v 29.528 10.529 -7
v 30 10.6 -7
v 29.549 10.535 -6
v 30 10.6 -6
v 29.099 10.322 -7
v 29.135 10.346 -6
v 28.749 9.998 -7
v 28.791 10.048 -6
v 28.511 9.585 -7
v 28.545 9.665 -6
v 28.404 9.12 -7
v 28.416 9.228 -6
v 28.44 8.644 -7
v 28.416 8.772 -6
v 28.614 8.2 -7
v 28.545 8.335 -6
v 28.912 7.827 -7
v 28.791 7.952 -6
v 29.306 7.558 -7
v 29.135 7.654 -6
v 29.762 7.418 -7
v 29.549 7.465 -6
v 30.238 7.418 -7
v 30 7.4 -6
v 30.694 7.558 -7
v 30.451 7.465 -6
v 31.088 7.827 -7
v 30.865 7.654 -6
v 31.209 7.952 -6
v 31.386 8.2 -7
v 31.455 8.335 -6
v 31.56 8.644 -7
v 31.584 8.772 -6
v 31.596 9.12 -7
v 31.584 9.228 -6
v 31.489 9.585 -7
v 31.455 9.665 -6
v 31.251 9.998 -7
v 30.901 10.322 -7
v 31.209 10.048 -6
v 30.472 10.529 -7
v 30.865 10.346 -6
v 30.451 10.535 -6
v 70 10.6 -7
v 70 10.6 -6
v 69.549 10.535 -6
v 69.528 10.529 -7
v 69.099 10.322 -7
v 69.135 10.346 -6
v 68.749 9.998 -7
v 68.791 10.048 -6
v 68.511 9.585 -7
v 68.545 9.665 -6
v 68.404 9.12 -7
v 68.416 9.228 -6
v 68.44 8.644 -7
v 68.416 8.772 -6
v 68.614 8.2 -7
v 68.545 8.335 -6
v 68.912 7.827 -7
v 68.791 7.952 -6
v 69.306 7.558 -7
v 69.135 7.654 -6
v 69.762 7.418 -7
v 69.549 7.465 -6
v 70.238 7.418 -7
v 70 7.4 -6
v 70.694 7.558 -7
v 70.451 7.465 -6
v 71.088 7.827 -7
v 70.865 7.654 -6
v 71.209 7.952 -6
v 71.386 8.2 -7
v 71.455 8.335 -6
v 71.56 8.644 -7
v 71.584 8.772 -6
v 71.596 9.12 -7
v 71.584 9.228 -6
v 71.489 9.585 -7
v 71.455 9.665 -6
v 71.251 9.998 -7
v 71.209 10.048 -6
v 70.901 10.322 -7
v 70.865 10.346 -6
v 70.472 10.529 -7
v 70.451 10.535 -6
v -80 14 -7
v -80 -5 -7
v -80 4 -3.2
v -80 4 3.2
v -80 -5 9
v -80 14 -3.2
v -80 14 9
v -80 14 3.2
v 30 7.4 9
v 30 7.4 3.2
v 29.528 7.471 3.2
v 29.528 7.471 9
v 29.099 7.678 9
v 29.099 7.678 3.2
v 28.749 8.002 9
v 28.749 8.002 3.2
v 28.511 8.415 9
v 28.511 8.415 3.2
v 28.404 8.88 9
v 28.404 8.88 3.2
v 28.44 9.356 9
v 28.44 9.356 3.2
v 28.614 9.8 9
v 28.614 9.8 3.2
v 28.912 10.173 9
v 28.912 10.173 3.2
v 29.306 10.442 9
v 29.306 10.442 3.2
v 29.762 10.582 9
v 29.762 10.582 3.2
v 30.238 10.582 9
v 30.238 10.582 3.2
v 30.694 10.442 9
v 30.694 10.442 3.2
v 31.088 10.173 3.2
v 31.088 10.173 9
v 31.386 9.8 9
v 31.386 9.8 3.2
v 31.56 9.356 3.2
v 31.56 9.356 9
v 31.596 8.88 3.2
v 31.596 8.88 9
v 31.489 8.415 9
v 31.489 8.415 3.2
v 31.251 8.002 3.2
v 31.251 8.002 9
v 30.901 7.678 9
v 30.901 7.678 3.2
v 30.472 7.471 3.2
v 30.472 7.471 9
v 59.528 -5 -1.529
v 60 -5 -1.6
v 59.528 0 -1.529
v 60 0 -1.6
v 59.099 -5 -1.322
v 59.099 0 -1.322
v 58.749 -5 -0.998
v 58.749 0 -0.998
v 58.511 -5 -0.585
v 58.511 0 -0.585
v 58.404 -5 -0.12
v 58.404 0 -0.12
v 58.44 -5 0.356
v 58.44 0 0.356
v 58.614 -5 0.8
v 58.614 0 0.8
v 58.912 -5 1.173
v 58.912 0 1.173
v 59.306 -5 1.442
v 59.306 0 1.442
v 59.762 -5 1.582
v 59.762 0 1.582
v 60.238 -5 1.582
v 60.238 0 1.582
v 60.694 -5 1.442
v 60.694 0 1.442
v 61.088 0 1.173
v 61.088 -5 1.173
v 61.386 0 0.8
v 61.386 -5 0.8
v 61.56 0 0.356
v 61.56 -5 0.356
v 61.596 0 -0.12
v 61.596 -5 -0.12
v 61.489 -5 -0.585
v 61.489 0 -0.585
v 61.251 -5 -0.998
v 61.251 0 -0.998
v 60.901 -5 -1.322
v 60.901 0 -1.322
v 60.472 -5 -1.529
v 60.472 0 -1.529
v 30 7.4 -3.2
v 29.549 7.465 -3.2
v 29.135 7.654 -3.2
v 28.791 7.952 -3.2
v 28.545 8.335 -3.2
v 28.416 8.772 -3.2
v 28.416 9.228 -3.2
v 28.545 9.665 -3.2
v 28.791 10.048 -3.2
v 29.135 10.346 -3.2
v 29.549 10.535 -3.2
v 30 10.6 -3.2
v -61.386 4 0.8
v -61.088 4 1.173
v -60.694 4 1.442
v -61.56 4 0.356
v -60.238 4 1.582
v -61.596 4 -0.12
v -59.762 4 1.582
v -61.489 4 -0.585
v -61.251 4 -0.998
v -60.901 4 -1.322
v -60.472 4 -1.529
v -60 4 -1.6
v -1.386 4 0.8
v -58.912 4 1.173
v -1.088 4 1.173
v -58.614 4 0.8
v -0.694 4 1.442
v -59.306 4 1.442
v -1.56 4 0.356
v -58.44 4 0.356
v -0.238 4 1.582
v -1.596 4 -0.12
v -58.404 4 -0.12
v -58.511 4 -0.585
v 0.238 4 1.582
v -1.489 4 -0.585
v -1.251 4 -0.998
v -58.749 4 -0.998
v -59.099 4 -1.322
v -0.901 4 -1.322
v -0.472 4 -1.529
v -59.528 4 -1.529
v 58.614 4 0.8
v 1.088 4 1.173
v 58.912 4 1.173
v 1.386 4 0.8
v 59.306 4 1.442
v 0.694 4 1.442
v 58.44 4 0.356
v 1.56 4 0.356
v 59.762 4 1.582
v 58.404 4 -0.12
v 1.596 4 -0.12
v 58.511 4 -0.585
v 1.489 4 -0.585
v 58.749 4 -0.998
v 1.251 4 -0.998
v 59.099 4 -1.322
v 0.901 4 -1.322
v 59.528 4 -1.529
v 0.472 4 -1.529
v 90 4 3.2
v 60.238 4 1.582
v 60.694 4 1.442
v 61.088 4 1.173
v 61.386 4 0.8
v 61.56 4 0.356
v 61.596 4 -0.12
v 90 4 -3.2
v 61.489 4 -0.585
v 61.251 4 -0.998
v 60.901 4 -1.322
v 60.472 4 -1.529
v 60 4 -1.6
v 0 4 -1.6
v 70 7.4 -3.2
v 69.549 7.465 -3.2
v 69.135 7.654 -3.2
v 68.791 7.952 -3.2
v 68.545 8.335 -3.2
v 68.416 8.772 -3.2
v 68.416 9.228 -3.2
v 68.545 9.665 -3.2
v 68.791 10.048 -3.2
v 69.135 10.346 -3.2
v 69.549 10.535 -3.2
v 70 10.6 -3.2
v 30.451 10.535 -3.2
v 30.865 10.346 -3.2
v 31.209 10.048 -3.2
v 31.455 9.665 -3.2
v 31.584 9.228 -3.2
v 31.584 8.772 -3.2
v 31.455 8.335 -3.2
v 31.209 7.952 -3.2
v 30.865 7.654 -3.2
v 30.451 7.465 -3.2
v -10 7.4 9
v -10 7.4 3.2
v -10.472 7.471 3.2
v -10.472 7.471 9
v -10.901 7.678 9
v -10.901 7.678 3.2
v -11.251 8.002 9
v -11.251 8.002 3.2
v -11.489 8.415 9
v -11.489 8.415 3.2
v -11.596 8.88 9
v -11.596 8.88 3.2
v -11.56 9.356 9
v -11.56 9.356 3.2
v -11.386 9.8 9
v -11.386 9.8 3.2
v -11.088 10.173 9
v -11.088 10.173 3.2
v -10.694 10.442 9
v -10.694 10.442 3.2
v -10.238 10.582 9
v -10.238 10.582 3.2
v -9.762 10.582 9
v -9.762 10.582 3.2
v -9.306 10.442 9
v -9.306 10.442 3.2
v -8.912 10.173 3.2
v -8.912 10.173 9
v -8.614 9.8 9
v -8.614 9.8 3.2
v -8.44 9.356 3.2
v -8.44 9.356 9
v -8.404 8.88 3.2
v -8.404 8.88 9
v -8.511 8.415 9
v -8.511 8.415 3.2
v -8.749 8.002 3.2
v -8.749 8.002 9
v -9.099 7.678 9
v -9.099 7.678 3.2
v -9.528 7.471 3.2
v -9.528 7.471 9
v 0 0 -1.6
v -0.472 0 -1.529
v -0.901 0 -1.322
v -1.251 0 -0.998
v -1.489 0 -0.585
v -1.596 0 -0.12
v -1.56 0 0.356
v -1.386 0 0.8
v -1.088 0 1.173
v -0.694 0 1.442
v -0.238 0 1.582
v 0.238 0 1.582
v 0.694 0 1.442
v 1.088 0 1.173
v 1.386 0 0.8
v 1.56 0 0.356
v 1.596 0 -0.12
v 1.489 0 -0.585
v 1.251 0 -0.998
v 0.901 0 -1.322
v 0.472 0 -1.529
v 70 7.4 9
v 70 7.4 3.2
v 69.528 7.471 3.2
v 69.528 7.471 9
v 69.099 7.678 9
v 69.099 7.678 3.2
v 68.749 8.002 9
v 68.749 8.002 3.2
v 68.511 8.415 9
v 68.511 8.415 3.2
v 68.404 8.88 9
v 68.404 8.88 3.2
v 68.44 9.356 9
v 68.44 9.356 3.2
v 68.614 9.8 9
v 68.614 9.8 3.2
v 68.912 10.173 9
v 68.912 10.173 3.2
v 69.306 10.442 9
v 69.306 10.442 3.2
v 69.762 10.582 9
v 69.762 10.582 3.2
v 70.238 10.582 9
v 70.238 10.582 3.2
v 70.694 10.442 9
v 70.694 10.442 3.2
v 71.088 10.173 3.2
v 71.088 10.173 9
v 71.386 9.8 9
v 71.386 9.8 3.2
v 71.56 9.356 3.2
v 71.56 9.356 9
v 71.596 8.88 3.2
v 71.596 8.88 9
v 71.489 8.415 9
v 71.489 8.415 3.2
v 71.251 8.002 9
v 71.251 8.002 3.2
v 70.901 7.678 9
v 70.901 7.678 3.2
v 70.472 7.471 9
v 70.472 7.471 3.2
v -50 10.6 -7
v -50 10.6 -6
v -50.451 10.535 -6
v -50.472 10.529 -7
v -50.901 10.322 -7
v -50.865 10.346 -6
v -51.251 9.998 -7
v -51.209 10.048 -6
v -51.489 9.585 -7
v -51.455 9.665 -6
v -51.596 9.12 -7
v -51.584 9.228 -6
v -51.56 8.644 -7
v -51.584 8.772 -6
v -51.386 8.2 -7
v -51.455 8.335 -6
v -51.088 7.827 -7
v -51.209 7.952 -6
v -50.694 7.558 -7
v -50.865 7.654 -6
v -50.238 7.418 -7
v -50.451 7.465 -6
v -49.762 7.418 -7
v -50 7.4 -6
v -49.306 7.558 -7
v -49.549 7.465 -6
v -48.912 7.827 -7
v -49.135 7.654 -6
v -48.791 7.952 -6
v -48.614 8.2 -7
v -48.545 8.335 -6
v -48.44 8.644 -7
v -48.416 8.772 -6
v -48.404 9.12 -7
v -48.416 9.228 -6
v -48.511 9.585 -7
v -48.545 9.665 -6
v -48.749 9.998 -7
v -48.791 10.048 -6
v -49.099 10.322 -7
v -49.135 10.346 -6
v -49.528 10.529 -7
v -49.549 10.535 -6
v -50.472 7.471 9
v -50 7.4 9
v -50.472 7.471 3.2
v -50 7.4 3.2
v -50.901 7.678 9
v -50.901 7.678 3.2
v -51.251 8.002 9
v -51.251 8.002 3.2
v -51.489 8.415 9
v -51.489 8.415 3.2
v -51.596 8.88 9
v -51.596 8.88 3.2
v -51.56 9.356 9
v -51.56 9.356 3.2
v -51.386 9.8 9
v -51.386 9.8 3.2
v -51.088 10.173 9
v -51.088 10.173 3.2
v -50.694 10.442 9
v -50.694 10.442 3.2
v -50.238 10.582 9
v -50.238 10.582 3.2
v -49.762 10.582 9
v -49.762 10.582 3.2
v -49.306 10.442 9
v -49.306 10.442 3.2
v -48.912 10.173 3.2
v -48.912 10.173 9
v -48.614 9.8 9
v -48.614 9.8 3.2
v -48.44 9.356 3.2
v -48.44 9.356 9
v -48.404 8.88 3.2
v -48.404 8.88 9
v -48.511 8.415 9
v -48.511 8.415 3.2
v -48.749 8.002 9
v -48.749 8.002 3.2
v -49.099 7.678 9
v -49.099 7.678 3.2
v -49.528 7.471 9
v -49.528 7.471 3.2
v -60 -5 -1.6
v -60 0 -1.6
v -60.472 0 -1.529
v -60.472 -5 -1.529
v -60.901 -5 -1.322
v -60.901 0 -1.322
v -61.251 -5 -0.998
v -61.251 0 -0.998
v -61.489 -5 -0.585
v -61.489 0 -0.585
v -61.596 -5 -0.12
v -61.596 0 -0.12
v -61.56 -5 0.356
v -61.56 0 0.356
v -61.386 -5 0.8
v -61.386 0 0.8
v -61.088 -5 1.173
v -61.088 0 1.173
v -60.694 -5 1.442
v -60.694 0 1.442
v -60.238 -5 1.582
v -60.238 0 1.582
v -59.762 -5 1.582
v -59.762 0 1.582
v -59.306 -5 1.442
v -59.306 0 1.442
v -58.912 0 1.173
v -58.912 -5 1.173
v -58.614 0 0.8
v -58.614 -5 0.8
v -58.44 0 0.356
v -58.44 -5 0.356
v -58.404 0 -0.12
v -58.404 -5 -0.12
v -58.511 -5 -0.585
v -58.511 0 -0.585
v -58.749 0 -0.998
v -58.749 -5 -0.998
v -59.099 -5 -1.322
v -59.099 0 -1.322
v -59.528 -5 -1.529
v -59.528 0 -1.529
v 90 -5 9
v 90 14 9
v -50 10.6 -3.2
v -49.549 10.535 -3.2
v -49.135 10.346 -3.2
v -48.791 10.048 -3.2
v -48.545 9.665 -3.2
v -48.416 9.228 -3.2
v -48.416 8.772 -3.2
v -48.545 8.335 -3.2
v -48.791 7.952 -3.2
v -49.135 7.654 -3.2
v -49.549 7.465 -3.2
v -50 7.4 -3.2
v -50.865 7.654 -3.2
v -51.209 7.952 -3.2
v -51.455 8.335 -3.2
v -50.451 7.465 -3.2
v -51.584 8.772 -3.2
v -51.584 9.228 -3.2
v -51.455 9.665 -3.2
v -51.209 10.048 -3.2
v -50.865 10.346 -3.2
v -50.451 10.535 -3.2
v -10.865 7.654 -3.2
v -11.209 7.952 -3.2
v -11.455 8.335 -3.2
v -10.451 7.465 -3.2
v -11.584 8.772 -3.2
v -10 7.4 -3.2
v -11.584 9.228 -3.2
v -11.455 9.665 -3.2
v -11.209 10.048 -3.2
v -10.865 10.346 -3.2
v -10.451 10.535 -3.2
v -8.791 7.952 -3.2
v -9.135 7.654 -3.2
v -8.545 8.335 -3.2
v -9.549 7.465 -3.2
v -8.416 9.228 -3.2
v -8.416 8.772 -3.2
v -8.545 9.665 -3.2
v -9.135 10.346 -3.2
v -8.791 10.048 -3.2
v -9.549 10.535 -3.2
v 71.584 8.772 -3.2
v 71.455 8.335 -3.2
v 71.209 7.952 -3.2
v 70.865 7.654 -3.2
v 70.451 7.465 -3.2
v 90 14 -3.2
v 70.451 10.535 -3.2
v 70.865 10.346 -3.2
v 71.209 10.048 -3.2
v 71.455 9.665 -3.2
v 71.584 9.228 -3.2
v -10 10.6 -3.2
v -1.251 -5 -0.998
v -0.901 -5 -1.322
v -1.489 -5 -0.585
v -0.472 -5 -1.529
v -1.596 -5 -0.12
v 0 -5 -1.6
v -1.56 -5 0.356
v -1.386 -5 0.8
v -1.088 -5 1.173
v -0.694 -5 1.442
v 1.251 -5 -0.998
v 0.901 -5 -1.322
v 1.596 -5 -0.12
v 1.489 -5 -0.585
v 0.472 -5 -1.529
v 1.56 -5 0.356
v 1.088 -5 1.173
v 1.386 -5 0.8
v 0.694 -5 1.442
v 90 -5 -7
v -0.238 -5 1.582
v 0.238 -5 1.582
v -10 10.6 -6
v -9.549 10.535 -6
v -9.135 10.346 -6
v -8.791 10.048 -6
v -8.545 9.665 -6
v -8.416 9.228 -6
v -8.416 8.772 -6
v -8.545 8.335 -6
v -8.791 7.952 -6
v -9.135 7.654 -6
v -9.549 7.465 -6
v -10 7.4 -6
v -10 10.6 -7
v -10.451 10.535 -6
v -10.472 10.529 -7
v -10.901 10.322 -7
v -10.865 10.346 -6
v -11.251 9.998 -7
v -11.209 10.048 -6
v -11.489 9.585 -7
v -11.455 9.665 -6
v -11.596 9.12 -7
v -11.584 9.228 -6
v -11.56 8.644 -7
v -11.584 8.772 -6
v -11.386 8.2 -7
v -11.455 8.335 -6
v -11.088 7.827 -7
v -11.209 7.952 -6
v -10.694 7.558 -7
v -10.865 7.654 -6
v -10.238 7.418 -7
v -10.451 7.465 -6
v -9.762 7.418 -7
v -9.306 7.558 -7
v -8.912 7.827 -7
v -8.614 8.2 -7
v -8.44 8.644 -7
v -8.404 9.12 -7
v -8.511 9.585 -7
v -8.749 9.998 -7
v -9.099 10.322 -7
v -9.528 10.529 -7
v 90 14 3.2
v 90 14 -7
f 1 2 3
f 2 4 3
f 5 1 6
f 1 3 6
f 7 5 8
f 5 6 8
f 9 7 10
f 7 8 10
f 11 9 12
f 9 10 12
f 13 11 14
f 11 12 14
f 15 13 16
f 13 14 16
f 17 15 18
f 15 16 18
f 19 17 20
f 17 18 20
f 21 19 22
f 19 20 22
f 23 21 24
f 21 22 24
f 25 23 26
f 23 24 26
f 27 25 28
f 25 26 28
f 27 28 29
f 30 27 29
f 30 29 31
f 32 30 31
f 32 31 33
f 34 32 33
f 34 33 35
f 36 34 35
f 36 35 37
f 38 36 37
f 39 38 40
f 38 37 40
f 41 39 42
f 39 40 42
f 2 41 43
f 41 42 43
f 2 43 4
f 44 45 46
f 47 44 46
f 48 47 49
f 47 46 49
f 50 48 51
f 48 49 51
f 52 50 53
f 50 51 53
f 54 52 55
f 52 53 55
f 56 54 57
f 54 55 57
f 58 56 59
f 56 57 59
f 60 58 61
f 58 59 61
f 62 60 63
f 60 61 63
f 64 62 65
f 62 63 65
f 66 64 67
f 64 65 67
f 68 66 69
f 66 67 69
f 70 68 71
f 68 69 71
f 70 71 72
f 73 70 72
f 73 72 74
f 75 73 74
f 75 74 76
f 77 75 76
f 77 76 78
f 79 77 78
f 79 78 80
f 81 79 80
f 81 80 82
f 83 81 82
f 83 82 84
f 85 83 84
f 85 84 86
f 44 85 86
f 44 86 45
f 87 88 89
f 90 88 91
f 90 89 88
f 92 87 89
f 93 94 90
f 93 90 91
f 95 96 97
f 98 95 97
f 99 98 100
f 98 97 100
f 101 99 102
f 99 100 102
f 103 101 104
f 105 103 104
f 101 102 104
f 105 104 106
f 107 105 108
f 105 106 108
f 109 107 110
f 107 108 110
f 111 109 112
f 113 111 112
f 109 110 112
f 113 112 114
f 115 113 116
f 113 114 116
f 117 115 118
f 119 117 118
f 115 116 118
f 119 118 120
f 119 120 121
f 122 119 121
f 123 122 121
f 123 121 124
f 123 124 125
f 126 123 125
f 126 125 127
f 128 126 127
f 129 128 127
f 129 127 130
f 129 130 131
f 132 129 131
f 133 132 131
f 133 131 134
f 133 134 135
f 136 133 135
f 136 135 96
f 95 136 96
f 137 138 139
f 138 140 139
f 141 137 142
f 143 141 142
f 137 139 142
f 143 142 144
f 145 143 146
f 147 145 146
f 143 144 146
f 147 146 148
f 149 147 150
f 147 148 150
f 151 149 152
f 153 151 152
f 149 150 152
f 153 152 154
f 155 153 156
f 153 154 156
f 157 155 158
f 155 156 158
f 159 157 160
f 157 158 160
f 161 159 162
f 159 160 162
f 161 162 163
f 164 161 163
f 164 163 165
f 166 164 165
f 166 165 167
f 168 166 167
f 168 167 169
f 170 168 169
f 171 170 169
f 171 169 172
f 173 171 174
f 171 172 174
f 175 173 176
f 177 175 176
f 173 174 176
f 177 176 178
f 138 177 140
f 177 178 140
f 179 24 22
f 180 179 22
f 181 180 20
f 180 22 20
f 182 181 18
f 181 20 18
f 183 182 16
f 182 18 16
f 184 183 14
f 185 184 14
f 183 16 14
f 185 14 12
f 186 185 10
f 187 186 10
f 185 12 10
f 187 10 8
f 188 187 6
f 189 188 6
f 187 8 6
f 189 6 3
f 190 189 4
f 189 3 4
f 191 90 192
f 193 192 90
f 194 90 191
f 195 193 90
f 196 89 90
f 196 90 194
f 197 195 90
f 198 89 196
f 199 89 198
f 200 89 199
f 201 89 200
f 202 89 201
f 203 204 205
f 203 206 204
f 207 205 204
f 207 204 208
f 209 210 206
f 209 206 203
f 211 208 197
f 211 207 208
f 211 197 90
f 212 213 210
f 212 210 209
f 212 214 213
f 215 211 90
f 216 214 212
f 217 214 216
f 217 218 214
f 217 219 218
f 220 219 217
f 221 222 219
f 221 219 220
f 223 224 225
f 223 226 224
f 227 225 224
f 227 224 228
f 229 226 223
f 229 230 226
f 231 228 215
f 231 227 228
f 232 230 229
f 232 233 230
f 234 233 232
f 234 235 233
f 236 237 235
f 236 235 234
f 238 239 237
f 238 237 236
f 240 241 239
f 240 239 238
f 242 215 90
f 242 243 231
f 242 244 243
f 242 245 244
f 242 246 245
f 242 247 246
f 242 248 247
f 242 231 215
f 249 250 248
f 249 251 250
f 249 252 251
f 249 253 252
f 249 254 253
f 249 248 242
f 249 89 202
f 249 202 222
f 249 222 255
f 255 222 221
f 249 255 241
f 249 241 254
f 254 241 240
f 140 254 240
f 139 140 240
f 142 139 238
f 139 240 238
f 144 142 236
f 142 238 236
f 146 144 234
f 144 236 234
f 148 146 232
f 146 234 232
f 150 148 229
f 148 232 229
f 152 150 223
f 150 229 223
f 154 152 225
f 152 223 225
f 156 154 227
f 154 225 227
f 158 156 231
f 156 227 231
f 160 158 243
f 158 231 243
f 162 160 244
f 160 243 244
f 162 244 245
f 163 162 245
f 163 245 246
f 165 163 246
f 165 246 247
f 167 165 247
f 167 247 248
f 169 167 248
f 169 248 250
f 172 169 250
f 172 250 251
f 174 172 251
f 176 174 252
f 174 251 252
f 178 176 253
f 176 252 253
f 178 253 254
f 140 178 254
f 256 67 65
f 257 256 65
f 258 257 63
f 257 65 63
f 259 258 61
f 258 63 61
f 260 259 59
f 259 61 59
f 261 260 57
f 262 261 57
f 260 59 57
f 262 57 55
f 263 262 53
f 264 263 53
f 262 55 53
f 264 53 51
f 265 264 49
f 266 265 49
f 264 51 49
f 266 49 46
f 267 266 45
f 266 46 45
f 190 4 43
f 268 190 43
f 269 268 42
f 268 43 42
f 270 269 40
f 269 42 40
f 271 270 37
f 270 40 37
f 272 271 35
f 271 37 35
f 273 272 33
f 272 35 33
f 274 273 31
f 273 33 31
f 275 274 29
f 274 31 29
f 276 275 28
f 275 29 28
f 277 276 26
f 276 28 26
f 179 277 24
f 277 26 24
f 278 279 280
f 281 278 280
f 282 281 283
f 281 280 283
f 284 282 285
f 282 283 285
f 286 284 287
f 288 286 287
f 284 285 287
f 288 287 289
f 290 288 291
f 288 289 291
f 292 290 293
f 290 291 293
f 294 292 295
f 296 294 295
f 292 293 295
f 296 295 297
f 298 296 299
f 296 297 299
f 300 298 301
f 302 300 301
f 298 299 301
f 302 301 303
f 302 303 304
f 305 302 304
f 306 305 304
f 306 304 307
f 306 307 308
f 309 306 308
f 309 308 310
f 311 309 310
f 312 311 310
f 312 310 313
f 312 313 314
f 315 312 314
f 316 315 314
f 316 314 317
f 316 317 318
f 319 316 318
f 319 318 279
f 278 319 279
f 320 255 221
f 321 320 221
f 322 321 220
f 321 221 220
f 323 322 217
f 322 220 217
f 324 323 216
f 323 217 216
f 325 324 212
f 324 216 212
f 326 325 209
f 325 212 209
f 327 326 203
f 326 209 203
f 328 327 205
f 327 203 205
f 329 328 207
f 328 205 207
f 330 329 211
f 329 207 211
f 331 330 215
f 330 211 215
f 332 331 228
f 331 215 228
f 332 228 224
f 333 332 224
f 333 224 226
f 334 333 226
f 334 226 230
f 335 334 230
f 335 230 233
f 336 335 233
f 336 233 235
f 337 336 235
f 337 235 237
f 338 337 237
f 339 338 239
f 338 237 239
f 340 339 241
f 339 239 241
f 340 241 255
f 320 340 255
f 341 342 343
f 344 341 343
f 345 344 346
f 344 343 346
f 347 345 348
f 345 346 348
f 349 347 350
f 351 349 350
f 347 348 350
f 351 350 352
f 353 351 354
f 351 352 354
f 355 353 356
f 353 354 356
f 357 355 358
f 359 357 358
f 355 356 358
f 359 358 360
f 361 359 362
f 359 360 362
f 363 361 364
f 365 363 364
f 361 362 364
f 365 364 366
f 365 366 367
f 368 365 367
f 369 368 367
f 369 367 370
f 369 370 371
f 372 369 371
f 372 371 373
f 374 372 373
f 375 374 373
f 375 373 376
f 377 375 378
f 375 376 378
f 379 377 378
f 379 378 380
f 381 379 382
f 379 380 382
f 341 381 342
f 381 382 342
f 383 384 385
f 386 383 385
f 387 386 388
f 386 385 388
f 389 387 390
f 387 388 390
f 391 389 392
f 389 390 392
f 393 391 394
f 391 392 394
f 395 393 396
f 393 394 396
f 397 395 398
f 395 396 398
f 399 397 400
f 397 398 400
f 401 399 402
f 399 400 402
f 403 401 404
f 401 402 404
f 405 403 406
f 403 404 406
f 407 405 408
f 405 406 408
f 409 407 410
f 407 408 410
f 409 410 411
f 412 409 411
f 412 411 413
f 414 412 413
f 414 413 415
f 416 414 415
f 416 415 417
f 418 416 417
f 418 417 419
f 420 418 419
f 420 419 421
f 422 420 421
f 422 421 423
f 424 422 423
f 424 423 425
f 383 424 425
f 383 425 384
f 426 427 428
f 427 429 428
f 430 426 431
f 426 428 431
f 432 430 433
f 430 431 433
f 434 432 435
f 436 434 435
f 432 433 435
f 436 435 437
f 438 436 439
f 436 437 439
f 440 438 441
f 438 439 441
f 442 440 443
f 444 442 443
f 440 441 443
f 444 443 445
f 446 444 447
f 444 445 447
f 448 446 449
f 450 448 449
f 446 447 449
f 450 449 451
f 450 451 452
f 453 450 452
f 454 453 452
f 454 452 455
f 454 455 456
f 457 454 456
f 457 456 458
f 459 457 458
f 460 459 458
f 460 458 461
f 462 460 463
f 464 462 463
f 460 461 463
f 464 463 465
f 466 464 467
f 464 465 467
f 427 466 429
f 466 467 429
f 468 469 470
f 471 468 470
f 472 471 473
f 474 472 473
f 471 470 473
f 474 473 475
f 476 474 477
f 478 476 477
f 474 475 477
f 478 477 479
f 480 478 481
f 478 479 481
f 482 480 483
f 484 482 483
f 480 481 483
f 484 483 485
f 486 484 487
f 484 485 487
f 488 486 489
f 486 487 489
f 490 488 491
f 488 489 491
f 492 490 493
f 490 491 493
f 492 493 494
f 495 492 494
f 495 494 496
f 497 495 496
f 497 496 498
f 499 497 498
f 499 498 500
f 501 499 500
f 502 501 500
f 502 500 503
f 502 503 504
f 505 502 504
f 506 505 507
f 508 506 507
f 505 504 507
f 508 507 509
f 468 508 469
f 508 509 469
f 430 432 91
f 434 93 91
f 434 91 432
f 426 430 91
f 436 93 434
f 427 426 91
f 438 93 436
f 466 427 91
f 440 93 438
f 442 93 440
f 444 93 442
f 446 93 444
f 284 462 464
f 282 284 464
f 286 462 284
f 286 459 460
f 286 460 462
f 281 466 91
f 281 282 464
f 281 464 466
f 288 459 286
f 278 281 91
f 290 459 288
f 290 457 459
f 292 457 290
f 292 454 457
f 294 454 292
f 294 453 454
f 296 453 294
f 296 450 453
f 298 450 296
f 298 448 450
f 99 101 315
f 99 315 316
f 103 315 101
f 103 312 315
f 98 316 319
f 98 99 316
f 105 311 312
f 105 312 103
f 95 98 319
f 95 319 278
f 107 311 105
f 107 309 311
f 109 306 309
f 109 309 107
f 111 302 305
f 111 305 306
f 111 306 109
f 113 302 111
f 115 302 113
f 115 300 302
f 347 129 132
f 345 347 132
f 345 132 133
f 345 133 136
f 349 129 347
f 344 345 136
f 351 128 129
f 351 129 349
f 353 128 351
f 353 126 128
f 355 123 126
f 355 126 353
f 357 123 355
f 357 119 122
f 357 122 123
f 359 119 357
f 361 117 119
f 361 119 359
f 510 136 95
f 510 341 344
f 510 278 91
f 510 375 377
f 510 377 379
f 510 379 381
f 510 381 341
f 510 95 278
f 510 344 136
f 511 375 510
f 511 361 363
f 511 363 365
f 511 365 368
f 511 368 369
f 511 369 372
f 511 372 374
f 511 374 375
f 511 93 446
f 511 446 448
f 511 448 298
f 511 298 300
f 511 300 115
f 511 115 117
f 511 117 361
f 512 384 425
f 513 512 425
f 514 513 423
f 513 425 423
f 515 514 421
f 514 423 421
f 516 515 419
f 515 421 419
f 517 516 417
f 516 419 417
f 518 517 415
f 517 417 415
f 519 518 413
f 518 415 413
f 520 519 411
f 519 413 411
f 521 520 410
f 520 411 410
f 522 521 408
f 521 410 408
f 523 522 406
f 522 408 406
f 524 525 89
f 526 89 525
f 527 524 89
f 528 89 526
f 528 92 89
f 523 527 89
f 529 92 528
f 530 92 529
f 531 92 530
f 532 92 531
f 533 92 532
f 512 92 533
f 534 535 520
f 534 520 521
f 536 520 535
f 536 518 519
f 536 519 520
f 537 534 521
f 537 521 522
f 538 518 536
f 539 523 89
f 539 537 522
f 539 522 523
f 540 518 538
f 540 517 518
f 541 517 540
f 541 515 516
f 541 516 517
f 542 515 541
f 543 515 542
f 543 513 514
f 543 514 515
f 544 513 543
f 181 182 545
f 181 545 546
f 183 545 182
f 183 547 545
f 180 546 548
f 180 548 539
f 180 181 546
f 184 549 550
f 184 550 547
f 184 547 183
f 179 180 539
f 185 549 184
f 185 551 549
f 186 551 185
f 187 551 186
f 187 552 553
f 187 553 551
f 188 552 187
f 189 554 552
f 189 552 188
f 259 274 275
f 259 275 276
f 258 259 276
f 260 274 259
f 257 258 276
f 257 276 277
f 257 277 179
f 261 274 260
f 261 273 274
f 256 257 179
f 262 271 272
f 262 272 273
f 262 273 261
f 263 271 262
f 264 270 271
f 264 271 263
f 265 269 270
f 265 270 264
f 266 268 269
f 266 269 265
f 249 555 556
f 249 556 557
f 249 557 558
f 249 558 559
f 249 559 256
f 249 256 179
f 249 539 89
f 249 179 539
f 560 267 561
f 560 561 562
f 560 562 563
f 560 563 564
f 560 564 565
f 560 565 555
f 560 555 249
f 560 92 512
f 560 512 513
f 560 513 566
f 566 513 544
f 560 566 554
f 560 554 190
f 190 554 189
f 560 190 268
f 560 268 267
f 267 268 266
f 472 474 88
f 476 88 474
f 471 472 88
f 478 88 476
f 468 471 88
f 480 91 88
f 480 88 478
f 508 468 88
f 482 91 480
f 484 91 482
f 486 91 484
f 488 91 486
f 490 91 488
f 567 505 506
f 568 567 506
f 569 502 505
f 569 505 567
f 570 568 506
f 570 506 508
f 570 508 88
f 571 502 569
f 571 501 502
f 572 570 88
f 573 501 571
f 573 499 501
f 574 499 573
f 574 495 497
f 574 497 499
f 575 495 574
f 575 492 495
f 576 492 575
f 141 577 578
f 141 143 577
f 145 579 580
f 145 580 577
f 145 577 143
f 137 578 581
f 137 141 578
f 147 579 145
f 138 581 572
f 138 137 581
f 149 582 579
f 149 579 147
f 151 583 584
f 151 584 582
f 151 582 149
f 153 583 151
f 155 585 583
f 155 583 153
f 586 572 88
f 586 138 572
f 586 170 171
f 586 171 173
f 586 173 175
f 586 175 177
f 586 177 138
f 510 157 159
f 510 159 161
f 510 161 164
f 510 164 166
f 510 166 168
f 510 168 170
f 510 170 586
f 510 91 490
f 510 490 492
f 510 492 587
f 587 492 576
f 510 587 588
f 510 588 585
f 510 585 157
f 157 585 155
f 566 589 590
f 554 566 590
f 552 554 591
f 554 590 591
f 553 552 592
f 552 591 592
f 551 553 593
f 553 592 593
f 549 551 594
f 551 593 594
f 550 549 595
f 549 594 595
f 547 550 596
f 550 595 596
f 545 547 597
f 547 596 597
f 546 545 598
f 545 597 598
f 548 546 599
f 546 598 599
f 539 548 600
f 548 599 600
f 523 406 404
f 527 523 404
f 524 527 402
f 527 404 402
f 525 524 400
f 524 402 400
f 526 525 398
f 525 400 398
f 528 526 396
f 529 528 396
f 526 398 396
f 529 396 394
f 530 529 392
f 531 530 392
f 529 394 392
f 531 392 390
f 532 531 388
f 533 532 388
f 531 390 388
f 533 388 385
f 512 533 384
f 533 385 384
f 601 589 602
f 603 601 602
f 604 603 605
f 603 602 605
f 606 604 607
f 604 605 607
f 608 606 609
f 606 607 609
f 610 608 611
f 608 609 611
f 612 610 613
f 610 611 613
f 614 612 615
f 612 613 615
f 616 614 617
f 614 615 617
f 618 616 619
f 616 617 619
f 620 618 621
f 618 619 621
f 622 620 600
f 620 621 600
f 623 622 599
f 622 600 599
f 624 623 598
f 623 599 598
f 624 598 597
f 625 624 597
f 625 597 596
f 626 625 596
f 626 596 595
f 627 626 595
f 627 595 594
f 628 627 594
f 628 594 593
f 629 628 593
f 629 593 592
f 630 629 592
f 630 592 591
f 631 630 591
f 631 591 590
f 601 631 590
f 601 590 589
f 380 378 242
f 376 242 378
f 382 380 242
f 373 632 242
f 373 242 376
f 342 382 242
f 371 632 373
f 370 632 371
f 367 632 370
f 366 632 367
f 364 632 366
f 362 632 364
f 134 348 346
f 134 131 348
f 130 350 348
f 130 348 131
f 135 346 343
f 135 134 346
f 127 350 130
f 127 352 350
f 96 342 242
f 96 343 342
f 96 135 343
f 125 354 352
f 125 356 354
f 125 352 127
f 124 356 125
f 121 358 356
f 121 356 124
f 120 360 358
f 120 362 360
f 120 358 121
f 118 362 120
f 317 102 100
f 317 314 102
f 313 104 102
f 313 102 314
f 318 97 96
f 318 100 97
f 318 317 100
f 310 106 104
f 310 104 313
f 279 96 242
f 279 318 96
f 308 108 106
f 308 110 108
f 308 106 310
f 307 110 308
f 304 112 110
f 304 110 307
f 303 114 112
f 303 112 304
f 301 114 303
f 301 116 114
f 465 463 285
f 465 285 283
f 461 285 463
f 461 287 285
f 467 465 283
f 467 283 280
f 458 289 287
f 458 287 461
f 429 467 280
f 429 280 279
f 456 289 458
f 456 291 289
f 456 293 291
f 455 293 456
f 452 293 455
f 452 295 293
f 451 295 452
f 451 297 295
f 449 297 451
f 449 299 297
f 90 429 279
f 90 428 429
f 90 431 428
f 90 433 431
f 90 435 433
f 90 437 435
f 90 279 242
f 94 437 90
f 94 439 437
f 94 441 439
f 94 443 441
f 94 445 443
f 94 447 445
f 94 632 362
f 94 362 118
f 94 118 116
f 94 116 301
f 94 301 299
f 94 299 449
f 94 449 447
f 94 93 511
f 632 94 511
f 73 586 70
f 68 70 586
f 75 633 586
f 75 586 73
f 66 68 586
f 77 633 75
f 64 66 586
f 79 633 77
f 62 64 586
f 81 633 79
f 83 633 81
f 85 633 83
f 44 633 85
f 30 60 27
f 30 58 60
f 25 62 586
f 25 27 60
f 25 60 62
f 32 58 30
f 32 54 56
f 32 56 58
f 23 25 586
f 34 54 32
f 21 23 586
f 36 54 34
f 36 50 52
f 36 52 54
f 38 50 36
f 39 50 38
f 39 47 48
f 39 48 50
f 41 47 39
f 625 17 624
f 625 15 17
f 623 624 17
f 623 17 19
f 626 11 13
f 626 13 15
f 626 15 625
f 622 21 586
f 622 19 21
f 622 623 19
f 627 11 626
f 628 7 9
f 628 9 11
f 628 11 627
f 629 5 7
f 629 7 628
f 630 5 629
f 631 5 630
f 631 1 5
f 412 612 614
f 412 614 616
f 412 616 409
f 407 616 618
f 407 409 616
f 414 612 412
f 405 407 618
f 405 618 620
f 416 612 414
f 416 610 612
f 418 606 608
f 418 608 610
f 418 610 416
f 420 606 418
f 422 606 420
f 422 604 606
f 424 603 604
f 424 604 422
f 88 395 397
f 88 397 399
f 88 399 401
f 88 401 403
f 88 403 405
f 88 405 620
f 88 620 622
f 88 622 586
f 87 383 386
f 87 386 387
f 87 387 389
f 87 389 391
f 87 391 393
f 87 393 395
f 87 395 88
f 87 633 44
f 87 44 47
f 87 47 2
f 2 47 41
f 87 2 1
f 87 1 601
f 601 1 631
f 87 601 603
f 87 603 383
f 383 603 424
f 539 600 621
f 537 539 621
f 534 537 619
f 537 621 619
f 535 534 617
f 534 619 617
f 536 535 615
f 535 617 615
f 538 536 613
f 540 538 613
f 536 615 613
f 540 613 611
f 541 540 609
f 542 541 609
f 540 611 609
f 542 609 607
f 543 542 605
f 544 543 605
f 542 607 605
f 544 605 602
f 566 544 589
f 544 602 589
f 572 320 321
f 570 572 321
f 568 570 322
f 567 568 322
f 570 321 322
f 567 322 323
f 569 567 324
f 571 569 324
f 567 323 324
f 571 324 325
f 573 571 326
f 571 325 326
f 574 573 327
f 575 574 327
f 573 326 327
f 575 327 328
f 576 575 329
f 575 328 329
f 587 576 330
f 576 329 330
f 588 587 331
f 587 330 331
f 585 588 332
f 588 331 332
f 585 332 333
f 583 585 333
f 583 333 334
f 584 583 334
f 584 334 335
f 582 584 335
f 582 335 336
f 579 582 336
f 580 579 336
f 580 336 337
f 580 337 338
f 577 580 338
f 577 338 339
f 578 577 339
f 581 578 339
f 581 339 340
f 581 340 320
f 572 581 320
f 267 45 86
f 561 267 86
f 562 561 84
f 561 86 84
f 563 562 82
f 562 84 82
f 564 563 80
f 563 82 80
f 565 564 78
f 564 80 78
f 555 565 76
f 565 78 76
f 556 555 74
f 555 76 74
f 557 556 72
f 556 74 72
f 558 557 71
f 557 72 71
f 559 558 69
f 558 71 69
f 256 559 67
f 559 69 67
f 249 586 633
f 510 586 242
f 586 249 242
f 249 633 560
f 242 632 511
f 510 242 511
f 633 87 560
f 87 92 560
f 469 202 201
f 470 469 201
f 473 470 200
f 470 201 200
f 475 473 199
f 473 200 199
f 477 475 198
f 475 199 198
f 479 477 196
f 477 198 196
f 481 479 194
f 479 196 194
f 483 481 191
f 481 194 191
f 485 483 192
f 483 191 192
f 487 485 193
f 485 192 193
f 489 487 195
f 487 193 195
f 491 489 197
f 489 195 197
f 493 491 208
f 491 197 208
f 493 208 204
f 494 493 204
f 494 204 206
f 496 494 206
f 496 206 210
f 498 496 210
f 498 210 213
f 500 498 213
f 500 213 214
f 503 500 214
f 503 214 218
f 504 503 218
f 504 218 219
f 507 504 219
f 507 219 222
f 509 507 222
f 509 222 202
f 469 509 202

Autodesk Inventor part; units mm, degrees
ref_plane "YZ Plane" through (0, 0, 0) normal (1, 0, 0) x (0, 1, 0)
ref_plane "XZ Plane" through (0, 0, 0) normal (0, 1, 0) x (-1, 0, 0)
ref_plane "XY Plane" through (0, 0, 0) normal (0, 0, 1) x (1, 0, 0)
sketch "スケッチ1" plane through (0, 0, 0) normal (0, 1, 0) x (-1, 0, 0)
  line L0 (-90, -3) -> (90, -3)
  line L1 (90, -3) -> (90, 3)
  line L2 (90, 3) -> (-90, 3)
  line L3 (-90, 3) -> (-90, -3)
  line L4 (-90, -3) -> (90, 3) construction
  line L5 (90, -3) -> (-90, 3) construction
  point P0 (0, 0)
  dimension "d0" = 180
  dimension "d1" = 6
extrude "押し出し1" add sketch "スケッチ1" along normal blind 17
sketch "スケッチ2" plane through (0, 0, 0) normal (0, -1, 0) x (1, 0, 0)
  line L0 (-90, 3) -> (90, 3) projected
  line L1 (90, 3) -> (-80, 3)
  line L2 (-80, 3) -> (-80, 9)
  line L3 (-80, 9) -> (90, 9)
  line L4 (90, 9) -> (90, 3)
  line L5 (90, 3) -> (90, -3) projected
  line L6 (90, -3) -> (-80, -3)
  line L7 (-80, -3) -> (-80, -6)
  line L8 (-80, -6) -> (90, -6)
  line L9 (90, -6) -> (90, -3)
  point P0 (0, 0)
  dimension "d4" = 170
  dimension "d5" = 6
  dimension "d6" = 170
  dimension "d7" = 3
extrude "押し出し2" add sketch "スケッチ2" against normal blind 14
sketch "スケッチ3" plane through (0, 17, 0) normal (0, 1, 0) x (1, 0, 0)
  line L0 (-90, 3) -> (-90, -3) projected
  line L1 (90, -3) -> (90, 3) projected
  line L2 (-90, 3) -> (90, 3)
  line L3 (90, 3) -> (90, -3)
  line L4 (90, -3) -> (-90, -3)
  line L5 (-90, -3) -> (-90, 3)
  point P0 (0, 0)
extrude "押し出し3" cut sketch "スケッチ3" against normal blind 13
sketch "スケッチ4" plane through (0, 4, 0) normal (0, 1, 0) x (1, 0, 0)
  line L0 (-90, -3) -> (-90, 3) projected
  line L1 (-80, 6) -> (-80, 3) projected
  line L2 (-90, -3) -> (-80, -3)
  line L3 (-80, -3) -> (-80, 3)
  line L4 (-80, 3) -> (-90, 3)
  line L5 (-90, 3) -> (-90, -3)
  point P0 (0, 0)
extrude "押し出し4" cut sketch "スケッチ4" against normal blind 13
sketch "スケッチ5" plane through (0, 14, 0) normal (0, 1, 0) x (1, 0, 0)
  line L0 (97.0492, -3.2) -> (-97.0492, -3.2)
  line L1 (-97.0492, -3.2) -> (-97.0492, 3.2)
  line L2 (-97.0492, 3.2) -> (97.0492, 3.2)
  line L3 (97.0492, 3.2) -> (97.0492, -3.2)
  line L4 (97.0492, -3.2) -> (-97.0492, 3.2) construction
  line L5 (-97.0492, -3.2) -> (97.0492, 3.2) construction
  point P0 (0, 0)
  dimension "d14" = 6.4
extrude "押し出し5" cut sketch "スケッチ5" against normal blind 10
sketch "スケッチ6" plane through (-80, 0, 9) normal (0, 0, 1) x (1, 0, 0)
  line L0 (0, 14) -> (170, 14) projected
  line L1 (170, 0) -> (170, 14) projected
  point P0 (80, 0)
  point P1 (150, 9)
  point P2 (110, 9)
  point P3 (70, 9)
  point P4 (30, 9)
  dimension "d17" = 5
  dimension "d18" = 20
  dimension "d19" = 40
  dimension "d20" = 5
  dimension "d21" = 40
  dimension "d22" = 40
hole "穴1" at (70, 9, 9) at (30, 9, 9) at (-10, 9, 9) at (-50, 9, 9) direction (0, 0, -1) diameter 3.2 end through all
sketch "スケッチ7" plane through (0, 0, 0) normal (0, -1, 0) x (1, 0, 0)
  line L0 (-80, -6) -> (90, -6) projected
  line L1 (90, -6) -> (90, 9) projected
  line L2 (-80, -3.2) -> (90, -3.2) projected
  point P0 (0, 0)
  point P1 (60, 0)
  point P2 (0, 0)
  point P3 (-60, 0)
  dimension "d30" = 6
  dimension "d31" = 30
  dimension "d32" = 60
hole "穴2" at (60, 0, 0) at (0, 0, 0) at (-60, 0, 0) direction (0, 1, 0) diameter 3.2 end through all
sketch "スケッチ8" plane through (90, 0, -6) normal (0, 0, -1) x (-1, 0, 0)
  line L0 (0, 0) -> (0, 14) projected
  line L1 (0, 0) -> (170, 0)
  line L2 (170, 0) -> (170, 14)
  line L3 (170, 14) -> (0, 14)
  line L4 (0, 14) -> (0, 0)
  point P0 (90, 0)
extrude "押し出し6" add sketch "スケッチ8" along normal blind 1
sketch "スケッチ9" plane through (90, 0, -7) normal (0, 0, -1) x (-1, 0, 0)
  circle A0 centre (20, 9) radius 1.6 projected
  circle A1 centre (60, 9) radius 1.6 projected
  circle A2 centre (100, 9) radius 1.6 projected
  circle A3 centre (140, 9) radius 1.6 projected
  point P0 (90, 0)
hole "穴3" at (70, 9, -7) at (30, 9, -7) at (-10, 9, -7) at (-50, 9, -7) direction (0, 0, 1) diameter 3.2 depth 10
sketch "スケッチ10" plane through (0, 0, 0) normal (0, -1, 0) x (1, 0, 0)
  line L0 (90, -7) -> (90, 9) projected
  line L1 (-80, 9) -> (90, 9) projected
  line L2 (90, -7) -> (-80, -7)
  line L3 (-80, -7) -> (-80, 9)
  line L4 (-80, 9) -> (90, 9)
  line L5 (90, 9) -> (90, -7)
  point P0 (0, 0)
extrude "押し出し7" add sketch "スケッチ10" along normal blind 5
sketch "スケッチ11" plane through (0, -5, 0) normal (0, -1, 0) x (1, 0, 0)
  circle A0 centre (0, 0) radius 1.6 projected
  circle A1 centre (-60, 0) radius 1.6 projected
  circle A2 centre (60, 0) radius 1.6 projected
hole "穴4" at (0, -5, 0) at (-60, -5, 0) at (60, -5, 0) direction (0, 1, 0) diameter 3.2 depth 10
properties part number "lock1"
